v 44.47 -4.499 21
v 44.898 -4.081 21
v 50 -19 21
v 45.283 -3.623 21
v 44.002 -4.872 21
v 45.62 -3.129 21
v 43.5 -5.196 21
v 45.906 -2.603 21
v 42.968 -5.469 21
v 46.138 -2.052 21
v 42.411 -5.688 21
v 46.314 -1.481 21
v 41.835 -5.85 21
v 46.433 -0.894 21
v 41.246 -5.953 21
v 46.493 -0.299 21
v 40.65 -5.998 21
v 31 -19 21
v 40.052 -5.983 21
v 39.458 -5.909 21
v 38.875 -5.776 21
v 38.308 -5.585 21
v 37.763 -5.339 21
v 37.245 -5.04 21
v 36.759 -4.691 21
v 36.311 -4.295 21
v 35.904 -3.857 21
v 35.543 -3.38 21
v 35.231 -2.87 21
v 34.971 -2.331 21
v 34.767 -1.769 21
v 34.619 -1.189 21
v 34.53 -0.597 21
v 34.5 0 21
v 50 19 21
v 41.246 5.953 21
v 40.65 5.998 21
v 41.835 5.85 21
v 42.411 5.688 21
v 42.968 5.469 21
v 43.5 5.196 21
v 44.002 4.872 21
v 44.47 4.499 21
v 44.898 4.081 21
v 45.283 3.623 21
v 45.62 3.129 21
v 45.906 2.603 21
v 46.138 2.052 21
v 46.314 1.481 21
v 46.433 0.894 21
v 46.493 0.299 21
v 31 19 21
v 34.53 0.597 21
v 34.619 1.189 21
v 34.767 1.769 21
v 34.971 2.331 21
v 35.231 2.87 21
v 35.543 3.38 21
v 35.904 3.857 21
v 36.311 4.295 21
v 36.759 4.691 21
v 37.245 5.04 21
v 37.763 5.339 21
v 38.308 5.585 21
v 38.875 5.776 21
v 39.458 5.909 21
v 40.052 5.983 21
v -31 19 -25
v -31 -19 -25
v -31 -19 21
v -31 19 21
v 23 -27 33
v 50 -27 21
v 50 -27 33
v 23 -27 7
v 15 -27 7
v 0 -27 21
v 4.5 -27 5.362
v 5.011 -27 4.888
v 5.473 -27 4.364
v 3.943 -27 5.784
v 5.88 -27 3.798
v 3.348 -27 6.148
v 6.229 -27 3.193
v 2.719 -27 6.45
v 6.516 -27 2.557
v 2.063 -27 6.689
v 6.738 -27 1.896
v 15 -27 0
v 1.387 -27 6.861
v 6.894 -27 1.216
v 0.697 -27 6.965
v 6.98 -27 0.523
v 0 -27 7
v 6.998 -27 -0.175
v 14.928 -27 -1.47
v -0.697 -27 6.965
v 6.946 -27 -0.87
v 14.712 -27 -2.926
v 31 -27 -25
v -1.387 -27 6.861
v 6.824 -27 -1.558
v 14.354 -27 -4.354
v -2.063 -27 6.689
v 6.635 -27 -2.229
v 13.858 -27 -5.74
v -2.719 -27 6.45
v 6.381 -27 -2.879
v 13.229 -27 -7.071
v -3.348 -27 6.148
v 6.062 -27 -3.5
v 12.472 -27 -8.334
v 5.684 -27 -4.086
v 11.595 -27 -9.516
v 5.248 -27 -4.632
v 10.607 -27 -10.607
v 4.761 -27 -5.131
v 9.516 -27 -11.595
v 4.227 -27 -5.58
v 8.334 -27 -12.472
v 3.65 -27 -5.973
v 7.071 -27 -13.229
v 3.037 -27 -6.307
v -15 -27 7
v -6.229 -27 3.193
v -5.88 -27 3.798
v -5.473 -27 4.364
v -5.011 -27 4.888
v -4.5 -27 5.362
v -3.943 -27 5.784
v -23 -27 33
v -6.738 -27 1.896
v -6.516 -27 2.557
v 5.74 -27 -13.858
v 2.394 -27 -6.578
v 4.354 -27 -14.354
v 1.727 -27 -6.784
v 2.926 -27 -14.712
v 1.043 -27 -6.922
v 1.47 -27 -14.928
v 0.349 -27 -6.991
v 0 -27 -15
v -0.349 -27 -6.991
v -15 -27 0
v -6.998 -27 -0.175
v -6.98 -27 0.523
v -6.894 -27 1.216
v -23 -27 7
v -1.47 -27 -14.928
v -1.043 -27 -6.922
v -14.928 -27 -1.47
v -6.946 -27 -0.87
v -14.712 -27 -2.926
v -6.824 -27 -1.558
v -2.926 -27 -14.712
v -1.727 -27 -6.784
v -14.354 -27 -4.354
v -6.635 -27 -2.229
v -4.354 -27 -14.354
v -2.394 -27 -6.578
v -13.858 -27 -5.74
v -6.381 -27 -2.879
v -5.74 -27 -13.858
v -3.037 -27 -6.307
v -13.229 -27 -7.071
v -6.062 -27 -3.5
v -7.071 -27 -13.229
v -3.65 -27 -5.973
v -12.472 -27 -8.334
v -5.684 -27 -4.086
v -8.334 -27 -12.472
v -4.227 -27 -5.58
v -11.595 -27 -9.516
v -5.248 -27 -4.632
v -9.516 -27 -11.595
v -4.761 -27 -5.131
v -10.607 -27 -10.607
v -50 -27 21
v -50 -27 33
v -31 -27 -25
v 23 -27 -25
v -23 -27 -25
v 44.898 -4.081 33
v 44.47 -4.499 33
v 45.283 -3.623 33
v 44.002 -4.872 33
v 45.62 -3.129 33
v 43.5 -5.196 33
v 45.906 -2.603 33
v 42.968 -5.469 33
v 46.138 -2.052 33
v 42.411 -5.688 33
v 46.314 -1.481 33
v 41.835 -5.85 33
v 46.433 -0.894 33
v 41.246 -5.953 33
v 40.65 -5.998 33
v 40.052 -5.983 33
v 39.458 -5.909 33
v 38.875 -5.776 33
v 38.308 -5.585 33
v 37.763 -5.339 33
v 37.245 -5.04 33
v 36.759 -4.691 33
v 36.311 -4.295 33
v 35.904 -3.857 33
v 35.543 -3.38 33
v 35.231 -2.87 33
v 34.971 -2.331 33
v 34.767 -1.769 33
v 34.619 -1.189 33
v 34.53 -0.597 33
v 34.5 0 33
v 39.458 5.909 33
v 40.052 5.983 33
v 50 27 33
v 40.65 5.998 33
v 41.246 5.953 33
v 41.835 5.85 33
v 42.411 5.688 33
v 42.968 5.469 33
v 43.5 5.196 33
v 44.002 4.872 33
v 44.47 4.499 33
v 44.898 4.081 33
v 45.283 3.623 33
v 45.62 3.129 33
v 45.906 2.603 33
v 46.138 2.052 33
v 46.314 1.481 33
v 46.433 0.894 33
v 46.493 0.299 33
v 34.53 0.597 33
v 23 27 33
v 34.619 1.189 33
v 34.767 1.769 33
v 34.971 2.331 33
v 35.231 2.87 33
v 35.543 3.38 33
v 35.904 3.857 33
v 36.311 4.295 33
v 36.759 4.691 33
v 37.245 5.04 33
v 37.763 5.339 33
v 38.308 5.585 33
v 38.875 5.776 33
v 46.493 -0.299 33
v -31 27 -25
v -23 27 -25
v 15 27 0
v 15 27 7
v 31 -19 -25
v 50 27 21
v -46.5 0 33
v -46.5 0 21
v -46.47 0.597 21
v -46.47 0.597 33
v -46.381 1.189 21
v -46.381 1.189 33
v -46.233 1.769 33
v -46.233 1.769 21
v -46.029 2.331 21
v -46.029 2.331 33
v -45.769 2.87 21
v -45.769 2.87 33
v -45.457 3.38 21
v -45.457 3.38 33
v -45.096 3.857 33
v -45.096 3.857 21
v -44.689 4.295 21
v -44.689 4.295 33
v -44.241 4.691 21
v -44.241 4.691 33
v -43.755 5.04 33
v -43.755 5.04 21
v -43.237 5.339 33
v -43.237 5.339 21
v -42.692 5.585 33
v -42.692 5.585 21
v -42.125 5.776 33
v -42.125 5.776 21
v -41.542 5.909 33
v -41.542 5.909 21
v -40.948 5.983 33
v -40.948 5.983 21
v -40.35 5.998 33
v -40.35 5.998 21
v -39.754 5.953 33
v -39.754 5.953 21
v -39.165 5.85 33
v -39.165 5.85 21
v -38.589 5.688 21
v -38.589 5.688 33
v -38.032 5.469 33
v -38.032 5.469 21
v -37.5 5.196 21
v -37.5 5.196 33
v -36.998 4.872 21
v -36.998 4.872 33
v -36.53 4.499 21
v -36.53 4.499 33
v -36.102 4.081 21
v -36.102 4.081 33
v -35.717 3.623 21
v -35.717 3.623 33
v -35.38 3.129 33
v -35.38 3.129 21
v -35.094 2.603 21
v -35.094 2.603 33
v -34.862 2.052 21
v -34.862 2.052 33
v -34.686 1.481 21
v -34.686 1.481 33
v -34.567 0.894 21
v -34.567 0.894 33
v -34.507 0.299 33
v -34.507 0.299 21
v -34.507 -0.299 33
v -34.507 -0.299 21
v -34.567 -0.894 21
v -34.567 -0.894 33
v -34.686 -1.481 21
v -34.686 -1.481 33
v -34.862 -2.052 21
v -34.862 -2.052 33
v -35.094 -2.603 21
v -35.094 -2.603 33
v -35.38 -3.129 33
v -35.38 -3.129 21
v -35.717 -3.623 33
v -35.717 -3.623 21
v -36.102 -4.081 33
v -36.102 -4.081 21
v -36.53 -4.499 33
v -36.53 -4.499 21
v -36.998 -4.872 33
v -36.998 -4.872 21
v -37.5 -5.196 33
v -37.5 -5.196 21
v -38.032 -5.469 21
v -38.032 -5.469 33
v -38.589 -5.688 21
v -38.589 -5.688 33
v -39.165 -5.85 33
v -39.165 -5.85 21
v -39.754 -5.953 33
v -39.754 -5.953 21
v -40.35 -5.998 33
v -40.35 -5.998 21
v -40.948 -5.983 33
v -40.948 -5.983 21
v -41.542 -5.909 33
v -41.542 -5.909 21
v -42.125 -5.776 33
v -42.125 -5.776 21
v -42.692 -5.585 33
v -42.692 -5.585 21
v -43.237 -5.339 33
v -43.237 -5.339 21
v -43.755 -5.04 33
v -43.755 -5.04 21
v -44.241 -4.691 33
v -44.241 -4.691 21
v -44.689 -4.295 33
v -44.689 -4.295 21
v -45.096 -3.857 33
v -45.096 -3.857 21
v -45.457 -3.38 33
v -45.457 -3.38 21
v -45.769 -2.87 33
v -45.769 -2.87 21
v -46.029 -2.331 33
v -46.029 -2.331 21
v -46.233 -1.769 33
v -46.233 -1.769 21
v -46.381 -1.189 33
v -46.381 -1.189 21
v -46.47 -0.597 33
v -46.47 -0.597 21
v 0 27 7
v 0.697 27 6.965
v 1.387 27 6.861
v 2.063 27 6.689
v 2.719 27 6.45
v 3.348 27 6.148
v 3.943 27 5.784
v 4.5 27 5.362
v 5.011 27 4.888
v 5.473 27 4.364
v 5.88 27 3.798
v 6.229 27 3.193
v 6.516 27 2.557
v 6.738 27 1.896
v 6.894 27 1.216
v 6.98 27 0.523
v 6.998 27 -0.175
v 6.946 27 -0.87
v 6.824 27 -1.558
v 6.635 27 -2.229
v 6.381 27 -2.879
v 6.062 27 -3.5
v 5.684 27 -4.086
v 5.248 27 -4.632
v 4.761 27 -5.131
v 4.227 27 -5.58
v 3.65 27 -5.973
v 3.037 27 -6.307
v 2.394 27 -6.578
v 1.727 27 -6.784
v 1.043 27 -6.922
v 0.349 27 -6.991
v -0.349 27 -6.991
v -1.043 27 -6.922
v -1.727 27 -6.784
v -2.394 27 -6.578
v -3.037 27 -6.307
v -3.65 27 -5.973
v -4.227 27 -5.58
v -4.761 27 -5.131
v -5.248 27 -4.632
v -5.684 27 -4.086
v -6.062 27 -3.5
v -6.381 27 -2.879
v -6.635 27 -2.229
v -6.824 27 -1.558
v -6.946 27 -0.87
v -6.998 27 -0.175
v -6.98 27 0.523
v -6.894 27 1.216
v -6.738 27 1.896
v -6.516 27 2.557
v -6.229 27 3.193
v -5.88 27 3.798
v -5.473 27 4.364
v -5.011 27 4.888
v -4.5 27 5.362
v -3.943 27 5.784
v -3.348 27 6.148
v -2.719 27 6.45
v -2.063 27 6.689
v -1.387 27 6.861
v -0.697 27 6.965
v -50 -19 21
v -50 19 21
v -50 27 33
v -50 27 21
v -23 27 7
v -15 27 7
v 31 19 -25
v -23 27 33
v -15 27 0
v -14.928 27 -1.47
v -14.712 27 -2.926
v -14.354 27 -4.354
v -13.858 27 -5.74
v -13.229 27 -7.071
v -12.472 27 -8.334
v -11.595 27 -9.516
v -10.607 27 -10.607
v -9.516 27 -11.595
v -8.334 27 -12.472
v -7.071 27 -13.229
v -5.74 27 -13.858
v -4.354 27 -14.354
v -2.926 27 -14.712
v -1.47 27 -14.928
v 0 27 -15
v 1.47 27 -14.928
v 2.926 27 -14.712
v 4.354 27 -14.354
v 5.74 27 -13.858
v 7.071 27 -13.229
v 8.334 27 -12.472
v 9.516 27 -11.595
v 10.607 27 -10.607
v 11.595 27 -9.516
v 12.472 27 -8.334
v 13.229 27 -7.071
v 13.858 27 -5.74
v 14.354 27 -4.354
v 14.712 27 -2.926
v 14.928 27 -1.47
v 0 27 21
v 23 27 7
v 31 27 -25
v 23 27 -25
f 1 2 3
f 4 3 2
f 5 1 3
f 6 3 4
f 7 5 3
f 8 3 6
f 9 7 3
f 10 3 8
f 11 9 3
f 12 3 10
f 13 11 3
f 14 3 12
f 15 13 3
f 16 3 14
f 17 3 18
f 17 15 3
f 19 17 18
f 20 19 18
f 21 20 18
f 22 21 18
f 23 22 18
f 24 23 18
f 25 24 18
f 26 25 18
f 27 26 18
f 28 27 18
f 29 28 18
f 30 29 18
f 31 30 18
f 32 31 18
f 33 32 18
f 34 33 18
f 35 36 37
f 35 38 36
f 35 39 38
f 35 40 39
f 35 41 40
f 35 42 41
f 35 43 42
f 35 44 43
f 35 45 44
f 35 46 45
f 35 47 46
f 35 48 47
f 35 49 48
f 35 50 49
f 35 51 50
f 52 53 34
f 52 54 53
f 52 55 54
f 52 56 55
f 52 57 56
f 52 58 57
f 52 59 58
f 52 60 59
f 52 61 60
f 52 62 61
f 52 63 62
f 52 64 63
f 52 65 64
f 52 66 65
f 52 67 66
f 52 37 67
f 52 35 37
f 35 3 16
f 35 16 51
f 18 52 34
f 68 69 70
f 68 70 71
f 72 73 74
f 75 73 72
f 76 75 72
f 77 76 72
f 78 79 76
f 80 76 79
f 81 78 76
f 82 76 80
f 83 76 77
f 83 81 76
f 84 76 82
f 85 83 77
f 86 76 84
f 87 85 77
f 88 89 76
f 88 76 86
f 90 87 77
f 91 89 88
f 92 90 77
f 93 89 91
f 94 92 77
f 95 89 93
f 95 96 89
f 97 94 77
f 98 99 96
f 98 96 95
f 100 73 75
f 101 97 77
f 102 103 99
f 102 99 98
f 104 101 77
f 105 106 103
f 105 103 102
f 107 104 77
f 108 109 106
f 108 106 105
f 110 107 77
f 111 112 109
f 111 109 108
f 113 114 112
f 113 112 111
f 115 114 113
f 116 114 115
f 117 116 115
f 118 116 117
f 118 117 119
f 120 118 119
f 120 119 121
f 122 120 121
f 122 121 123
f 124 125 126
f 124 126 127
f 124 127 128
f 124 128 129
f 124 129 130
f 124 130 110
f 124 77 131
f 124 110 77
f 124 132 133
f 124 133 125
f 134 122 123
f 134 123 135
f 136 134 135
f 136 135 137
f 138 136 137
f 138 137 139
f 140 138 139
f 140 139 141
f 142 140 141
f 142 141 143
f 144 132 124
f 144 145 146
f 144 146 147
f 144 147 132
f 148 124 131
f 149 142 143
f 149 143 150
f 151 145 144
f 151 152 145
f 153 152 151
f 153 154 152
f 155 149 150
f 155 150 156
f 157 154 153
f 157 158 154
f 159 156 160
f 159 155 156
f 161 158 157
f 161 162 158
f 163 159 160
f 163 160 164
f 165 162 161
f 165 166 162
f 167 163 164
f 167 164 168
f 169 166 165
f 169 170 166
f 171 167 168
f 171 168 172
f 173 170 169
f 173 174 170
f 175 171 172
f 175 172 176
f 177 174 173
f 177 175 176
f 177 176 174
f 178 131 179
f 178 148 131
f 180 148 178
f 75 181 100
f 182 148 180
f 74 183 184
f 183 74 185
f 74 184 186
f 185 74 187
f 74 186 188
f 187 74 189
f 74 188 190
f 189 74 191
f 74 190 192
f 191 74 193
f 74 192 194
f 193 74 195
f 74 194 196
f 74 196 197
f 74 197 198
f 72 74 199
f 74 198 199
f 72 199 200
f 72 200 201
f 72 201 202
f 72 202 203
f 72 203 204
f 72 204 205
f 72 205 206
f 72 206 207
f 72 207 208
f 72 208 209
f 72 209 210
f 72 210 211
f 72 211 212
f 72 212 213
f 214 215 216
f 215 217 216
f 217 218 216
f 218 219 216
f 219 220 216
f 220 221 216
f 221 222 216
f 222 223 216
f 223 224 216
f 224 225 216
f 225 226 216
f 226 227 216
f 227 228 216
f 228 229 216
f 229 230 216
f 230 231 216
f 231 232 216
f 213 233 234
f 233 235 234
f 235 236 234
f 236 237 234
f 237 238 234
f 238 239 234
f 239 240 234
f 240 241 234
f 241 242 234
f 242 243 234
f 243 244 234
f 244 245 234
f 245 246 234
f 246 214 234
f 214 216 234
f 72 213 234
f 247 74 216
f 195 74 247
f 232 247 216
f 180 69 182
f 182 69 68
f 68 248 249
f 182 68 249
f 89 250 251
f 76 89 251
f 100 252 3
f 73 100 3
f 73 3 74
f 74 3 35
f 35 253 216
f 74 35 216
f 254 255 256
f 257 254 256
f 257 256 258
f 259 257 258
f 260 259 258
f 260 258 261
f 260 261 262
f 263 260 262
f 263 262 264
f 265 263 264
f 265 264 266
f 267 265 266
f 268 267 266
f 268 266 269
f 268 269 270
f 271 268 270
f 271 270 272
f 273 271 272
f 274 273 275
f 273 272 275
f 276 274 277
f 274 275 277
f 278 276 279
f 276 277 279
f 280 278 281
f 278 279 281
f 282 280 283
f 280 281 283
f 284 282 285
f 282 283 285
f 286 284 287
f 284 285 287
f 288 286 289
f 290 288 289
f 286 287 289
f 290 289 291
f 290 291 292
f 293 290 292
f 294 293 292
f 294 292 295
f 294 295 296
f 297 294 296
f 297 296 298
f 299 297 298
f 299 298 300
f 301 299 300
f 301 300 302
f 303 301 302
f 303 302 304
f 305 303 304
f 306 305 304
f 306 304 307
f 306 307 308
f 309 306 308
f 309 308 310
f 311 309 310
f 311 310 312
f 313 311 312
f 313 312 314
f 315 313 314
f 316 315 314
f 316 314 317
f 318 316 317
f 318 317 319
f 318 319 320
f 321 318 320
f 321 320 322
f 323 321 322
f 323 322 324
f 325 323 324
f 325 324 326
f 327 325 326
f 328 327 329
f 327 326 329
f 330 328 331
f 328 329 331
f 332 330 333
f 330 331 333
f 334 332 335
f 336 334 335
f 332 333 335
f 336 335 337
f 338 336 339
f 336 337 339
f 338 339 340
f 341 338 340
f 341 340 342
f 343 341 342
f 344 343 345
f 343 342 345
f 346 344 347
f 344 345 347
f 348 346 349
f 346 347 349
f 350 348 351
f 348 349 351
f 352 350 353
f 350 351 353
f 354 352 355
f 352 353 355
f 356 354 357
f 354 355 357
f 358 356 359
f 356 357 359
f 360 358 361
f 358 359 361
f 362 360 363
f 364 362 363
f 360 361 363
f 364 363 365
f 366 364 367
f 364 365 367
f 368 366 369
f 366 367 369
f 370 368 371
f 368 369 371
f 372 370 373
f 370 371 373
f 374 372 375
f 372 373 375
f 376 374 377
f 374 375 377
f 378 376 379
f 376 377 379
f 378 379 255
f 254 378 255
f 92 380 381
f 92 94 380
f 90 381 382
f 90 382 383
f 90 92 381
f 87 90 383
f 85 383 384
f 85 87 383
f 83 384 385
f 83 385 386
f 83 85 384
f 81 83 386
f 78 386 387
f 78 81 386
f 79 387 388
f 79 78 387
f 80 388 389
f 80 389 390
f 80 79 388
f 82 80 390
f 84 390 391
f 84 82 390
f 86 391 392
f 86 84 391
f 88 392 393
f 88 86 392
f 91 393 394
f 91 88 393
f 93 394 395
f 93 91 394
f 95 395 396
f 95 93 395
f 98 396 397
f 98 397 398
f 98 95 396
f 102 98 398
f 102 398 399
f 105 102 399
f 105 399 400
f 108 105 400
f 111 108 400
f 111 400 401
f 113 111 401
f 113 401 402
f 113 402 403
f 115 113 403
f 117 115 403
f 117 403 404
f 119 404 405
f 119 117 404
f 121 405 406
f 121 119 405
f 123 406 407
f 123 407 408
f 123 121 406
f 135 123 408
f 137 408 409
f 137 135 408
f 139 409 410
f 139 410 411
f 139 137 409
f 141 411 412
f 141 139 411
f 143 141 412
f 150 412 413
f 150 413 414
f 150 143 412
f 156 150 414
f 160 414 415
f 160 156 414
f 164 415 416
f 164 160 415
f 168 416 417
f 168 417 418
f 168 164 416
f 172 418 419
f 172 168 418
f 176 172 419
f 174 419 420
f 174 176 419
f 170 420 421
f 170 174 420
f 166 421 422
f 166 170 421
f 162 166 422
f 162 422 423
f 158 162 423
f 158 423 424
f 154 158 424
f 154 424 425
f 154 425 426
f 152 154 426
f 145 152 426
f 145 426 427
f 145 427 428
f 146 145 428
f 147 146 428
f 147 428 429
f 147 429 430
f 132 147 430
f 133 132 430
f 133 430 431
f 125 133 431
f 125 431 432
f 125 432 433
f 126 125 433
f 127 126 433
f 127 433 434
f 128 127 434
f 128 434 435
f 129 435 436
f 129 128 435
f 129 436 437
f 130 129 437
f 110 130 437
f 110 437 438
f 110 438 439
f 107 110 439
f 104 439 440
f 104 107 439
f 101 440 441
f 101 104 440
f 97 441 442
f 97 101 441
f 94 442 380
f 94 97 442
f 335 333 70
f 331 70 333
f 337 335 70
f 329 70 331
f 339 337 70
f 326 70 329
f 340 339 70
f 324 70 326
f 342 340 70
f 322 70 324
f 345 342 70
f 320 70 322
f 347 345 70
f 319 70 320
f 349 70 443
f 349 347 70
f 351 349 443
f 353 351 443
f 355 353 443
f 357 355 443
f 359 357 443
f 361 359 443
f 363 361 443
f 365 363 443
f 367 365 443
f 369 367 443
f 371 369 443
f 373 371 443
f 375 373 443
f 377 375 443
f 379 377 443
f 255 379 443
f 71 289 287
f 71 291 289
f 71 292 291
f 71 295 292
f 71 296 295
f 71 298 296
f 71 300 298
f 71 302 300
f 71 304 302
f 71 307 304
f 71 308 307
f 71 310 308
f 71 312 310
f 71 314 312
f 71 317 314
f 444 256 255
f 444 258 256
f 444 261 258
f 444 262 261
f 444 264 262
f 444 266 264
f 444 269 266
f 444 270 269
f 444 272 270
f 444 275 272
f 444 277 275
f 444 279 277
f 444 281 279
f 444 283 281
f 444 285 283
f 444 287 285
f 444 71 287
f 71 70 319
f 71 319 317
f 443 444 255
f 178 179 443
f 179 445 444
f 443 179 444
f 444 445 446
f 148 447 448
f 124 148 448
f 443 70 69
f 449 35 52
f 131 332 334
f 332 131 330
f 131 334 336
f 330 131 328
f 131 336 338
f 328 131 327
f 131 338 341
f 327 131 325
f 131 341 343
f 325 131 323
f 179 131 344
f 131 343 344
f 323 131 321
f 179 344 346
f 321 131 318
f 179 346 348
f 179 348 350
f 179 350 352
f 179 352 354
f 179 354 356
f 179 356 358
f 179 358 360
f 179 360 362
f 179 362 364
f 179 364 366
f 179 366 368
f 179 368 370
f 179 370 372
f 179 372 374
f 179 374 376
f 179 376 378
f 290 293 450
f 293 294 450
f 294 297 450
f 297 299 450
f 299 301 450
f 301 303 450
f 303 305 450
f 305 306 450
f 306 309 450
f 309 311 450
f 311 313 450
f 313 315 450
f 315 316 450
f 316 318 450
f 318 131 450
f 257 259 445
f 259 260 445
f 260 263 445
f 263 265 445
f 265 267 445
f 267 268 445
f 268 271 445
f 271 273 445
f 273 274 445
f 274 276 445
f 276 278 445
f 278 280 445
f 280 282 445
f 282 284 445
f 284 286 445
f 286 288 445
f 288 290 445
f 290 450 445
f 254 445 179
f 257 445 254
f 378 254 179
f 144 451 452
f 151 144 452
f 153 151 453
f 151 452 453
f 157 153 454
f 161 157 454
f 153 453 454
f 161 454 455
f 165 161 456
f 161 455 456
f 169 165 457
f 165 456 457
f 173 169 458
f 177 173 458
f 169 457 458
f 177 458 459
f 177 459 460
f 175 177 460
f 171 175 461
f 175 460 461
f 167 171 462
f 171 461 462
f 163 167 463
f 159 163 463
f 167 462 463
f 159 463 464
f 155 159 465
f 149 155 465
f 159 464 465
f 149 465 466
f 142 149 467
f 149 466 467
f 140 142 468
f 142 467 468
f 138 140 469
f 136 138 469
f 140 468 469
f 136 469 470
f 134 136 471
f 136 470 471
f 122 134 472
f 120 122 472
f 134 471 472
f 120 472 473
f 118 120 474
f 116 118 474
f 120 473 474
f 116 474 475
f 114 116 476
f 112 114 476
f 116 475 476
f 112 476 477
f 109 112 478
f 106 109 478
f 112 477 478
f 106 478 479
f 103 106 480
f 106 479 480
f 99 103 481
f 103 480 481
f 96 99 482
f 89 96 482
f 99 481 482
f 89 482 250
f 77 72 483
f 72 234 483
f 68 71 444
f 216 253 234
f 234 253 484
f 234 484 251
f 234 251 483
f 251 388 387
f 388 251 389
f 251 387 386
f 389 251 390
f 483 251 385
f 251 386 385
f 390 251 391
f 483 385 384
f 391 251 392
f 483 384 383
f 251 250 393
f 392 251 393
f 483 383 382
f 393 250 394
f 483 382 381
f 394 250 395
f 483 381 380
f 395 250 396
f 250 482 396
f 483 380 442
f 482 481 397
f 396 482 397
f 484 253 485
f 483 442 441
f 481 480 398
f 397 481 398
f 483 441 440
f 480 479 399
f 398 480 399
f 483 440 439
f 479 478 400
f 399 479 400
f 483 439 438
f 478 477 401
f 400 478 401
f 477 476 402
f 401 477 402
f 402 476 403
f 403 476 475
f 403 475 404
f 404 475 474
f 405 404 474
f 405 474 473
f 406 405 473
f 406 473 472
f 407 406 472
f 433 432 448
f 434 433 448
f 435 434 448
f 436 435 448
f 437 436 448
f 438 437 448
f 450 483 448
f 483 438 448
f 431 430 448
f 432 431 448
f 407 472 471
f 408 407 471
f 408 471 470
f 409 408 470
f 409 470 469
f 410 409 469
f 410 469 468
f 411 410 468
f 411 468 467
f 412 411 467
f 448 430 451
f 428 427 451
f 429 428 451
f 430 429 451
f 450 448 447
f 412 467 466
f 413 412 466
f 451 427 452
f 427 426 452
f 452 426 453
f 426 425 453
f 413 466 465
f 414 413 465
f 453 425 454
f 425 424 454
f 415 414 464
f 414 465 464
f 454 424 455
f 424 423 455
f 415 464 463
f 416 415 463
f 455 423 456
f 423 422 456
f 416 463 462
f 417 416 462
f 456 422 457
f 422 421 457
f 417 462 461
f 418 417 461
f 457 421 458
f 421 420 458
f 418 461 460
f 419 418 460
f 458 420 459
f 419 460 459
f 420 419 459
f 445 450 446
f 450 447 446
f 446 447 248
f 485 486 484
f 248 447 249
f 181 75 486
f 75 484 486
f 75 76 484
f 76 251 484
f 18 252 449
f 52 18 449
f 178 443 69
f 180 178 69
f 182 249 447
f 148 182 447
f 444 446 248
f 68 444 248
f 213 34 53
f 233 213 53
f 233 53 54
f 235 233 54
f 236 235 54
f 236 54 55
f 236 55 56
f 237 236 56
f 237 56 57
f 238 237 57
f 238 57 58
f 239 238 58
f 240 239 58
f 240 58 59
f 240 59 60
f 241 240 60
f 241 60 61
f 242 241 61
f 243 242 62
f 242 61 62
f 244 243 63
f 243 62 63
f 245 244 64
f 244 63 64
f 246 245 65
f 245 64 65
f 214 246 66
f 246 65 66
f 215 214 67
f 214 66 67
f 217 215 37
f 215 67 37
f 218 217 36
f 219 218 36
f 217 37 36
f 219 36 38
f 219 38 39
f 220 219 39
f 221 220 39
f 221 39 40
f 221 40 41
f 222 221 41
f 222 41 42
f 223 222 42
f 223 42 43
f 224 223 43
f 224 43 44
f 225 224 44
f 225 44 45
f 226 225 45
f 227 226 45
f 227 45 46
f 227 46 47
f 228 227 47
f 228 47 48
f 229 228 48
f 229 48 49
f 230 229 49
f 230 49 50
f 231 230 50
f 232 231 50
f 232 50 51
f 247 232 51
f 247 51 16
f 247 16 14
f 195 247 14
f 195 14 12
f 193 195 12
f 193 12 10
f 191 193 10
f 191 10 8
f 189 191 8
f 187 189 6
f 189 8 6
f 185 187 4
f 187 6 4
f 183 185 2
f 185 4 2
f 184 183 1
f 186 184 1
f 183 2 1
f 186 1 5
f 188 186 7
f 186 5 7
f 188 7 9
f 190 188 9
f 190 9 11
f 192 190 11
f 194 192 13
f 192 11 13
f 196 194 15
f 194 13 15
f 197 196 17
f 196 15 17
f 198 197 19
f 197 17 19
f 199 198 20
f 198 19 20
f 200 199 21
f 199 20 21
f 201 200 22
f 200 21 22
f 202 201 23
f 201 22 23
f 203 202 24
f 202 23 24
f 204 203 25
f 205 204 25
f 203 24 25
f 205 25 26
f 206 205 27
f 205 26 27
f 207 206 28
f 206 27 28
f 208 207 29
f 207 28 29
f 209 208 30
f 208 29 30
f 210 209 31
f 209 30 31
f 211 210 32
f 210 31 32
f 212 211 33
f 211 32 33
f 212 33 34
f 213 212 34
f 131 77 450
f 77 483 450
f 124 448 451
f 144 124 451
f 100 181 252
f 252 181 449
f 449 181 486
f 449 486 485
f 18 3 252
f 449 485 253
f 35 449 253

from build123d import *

# Parameters (mm, degrees)
SKETCH_1_R          = 7
EXTRUDE_1_DEPTH     = 27
SKETCH_2_W          = 19
SKETCH_2_H          = 38
SKETCH_2_R          = 6
CUT_EXTRUDE_1_DEPTH = 46
SKETCH_2_2_R        = 6
CUT_EXTRUDE_2_DEPTH = 82.197290595


with BuildPart() as part:
    # 草图1 → 凸台-拉伸1 (new, symmetric)
    with BuildSketch(Plane(origin=(0, 0, 0), x_dir=(1, 0, 0), z_dir=(0, 1, 0))):
        with BuildLine():
            Line((15, 0), (15, -7))
            Line((15, -7), (23, -7))
            Line((23, -7), (23, 25))
            Line((23, 25), (31, 25))
            Line((31, 25), (50, -21))
            Line((50, -21), (50, -33))
            Line((50, -33), (23, -33))
            Line((23, -33), (0, -21))
            Line((0, -21), (-23, -33))
            Line((-23, -33), (-50, -33))
            Line((-50, -33), (-50, -21))
            Line((-50, -21), (-31, 25))
            Line((-31, 25), (-23, 25))
            Line((-23, 25), (-23, -7))
            Line((-23, -7), (-15, -7))
            Line((-15, -7), (-15, 0))
            ThreePointArc((-15, 0), (0, 15), (15, 0))
        make_face()
        with Locations(Location((0, 0, 0), (0, 0, 270))):
            Circle(SKETCH_1_R, mode=Mode.SUBTRACT)
    extrude(amount=EXTRUDE_1_DEPTH, both=True)

    # 草图2 → 切除-拉伸1 (cut)
    # profile 1 of 2: a face of its own
    with BuildSketch(Plane(origin=(0, 0, -25), x_dir=(-1, 0, 0), z_dir=(0, 0, -1))):
        with Locations((40.5, 0)):
            Rectangle(SKETCH_2_W, SKETCH_2_H)
        with Locations((40.5, 0)):
            Circle(SKETCH_2_R, mode=Mode.SUBTRACT)
    # profile 2 of 2: a face of its own
    with BuildSketch(Plane(origin=(0, 0, -25), x_dir=(-1, 0, 0), z_dir=(0, 0, -1))):
        with Locations((-40.5, 0)):
            Rectangle(SKETCH_2_W, SKETCH_2_H)
        with Locations((-40.5, 0)):
            Circle(SKETCH_2_R, mode=Mode.SUBTRACT)
    extrude(amount=-CUT_EXTRUDE_1_DEPTH, mode=Mode.SUBTRACT)

    # 草图2<2> → 切除-拉伸2 (cut, through all)
    with BuildSketch(Plane(origin=(0, 0, -25), x_dir=(-1, 0, 0), z_dir=(0, 0, -1))):
        with Locations((40.5, 0)):
            Circle(SKETCH_2_2_R)
        with Locations((-40.5, 0)):
            Circle(SKETCH_2_2_R)
    extrude(amount=-CUT_EXTRUDE_2_DEPTH, mode=Mode.SUBTRACT)


solid = part.part
